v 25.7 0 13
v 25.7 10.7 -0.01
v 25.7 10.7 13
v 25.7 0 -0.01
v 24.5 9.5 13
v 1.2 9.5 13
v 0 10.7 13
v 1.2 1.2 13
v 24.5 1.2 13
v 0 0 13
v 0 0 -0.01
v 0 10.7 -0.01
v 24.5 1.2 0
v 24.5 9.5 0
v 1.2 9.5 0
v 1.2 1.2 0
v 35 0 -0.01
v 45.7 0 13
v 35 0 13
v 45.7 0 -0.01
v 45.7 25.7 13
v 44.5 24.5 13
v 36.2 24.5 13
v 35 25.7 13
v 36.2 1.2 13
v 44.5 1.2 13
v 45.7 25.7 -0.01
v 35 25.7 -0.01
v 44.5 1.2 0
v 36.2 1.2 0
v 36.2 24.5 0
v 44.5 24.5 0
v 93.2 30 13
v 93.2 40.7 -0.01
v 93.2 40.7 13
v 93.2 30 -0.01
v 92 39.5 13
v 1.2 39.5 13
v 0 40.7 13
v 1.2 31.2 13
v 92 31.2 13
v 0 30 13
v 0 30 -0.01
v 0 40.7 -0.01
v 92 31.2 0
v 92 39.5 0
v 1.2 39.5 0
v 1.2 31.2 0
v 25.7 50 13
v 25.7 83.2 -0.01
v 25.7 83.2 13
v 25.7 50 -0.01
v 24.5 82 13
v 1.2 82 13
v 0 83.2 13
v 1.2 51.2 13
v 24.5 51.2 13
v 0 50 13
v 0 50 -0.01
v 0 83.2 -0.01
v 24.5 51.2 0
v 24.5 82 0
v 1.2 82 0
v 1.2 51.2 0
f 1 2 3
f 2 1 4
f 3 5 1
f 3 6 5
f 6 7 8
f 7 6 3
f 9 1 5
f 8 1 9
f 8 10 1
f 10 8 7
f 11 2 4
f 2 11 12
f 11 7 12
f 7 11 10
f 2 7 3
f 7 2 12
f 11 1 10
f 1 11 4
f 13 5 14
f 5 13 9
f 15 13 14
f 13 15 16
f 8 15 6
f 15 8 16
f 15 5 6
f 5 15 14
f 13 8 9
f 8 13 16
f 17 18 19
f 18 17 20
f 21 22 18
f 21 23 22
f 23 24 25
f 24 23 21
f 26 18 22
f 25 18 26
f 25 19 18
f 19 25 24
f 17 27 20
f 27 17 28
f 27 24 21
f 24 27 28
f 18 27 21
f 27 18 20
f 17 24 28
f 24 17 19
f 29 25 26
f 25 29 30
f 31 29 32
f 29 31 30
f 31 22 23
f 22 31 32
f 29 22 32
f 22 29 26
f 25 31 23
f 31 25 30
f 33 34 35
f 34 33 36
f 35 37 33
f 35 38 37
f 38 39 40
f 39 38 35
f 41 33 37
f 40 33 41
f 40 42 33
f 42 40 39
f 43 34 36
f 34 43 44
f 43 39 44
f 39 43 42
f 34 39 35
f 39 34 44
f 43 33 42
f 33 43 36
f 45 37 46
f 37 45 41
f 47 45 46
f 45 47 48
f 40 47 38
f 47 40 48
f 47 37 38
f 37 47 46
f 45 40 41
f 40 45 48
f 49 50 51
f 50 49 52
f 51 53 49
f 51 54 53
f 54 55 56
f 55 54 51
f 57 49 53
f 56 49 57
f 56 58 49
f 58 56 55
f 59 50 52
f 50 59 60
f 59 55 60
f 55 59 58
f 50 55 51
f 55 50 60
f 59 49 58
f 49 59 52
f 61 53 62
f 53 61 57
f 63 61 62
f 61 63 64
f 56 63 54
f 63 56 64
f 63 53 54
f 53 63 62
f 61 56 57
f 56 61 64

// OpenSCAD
// file: ../../Base/Boxes.scad
// Fischertechnik Box Foundation
// Pre-designed Boxes

use <Constants.scad>

include <PlacementOptions.scad>

box190Width = 190;
box190Depth = 130;
box130Width = 130;
box130Depth = 95;
boxUsageHeight = 33.9;
boxWallThickness = 2.4;
boxBaseThickness = 1.0;

// getBoxWallThickness()
// Gets the wall thickness of a Fischertechnik Box

function getBoxWallThickness() = boxWallThickness;

// Gets the usable height of a fischertechnik box
function getBoxUsageHeight() = boxUsageHeight;

// Gets the thickness of the Fischertechnik box base.
function getBoxBaseThickness() = boxBaseThickness;

// Gets the usable inner space of a Box 190 as an x/y-list
function getBox190Space() = [
    box190Width - 2*getBoxWallThickness(), 
    box190Depth - 2*getBoxWallThickness() ];

// Imports the Fischertechnik empty box 130x190 mm and places it at position 0,0
// 190x130 are the outer sizes, the inner space is slightly smaller. Use getBox190Space() to get the inner sizes.
// This module needs the STL file "Fischertechnik Box 130x190.stl" in the library path.
// The box is positioned that the usable inner space is at the 0,0,0 position. The

module Box190() {
    translate([-getBoxWallThickness(),-getBoxWallThickness(),-getBoxBaseThickness()])
        import("Fischertechnik Box 130x190.stl", convexity=3);
}

// Gets the usable inner space of a Box 130 as an x/y-list
function getBox130Space() = [
    box130Width - 2*getBoxWallThickness(), 
    box130Depth - 2*getBoxWallThickness() ];

// Imports the Fischertechnik empty box 95x130 mm and places it at position 0,0
// 190x130 are the outer sizes, the inner space is slightly smaller. Use getBox190Space() to get the inner sizes.
// This module needs the STL file "Fischertechnik Box 95x130.stl" in the library path.
// The box is positioned that the usable inner space is at the 0,0,0 position. The

module Box130() {
    translate([-getBoxWallThickness(),-getBoxWallThickness(),-getBoxBaseThickness()])
        import("Fischertechnik Box 95x130.stl", convexity=3);
}

// Creates a web at the specified box walls
// corner 0 = LowerLeft, 1 = UpperLeft, 2 = UpperRight, 3 = LowerRight
// side 0 = LeftOfCorner, 1 = RightOfCorner
// distance = Distance in mm from the corner
// box = inner width and depth of the box (default: Box 190)
// webWidth = length of the web (default is 3 mms)
// webThickness = thickness of the web (default is 1 mm)

module BoxWeb(corner, side, distance, box=getBox190Space(), webWidth=3, webThickness=1.0) {
    sink = getBoxWallThickness()/2;

    width = (corner % 2 == 0) ? 
            (side == LeftOfCorner ? webWidth : webThickness) :
            (side == LeftOfCorner ? webThickness : webWidth);

    depth = (corner % 2 == 0) ? 
            (side == RightOfCorner ? webWidth : webThickness) :
            (side == RightOfCorner ? webThickness : webWidth);
    
    xDiff = corner == LowerLeft ? 
                (side == LeftOfCorner ? -sink : distance) :
            (corner == UpperLeft ?                
                (side == LeftOfCorner ? distance : -sink) :
            (corner == UpperRight ?
                (side == LeftOfCorner ? box.x-webWidth+sink : box.x-distance-webThickness) :
                (side == LeftOfCorner ? box.x-distance-webThickness: box.x-webWidth+sink)));

    yDiff = corner == LowerLeft ? 
                (side == RightOfCorner ? -sink : distance) :
            (corner == UpperLeft ?
                (side == RightOfCorner ? box.y-distance : box.y-webWidth+sink) :
            (corner == UpperRight ?
                (side == RightOfCorner ? box.y-webWidth+sink : box.y-distance) :
                (side == RightOfCorner ? distance : -sink)));
    
    translate([xDiff, yDiff, -getExcess()])
        cube([width, depth, boxUsageHeight + 2*getExcess()]);
}
// file: ../../Base/Rotation.scad
// Fischertechnik Box Foundation
// Geometry Helpers Rotation

include <PlacementOptions.scad>

// getRotatedSpace(space, rotation=NoRotation)
// Rotates the space dependent on the specified rotation

function getRotatedSpace(space, rotation=NoRotation) = [
    (rotation == Rotate90 || rotation == Rotate270) ? space.y : space.x,
    (rotation == Rotate90 || rotation == Rotate270) ? space.x : space.y
];

// Rotates the given space around the fixed left lower corner
// space = the space the children needs as width/depth list [width,depth]
// rotation = 0 Rotate0 degrees, 1 Rotate90 degrees, 2 Rotate180 degrees, 3 Rotate270 degrees (equivalent to -90)

module RotateFix(space, rotation=Rotate0) {
    dy = (rotation == Rotate0 || rotation == Rotate270) ? 0 :
        (rotation == Rotate90) ? space.x :
        space.y;
    dx = (rotation < Rotate180) ? 0 :
        (rotation == Rotate180) ? space.x :
        space.y;
    
    translate([dx, dy, 0])
        rotate([0, 0, rotations[rotation]])
            children();
}
// file: ../../Base/Alignment.scad
// Fischertechnik Box Foundation
// Geometry Helpers Alignment

include <PlacementOptions.scad>

// getAlignedX(elementWidth, spaceWidth, align=AlignRight, offset=0)
// Gets the aligned X offset of an element with the given
// width in the given space.
// elementWidth = The width of the element to positon
// spaceWidth = The space where the element should be aligned
// align = 0 AlignLeft, 1 AlignCenter, 2 AlignRight
// offset = an optional offset from the aligned position. When
// aligned left or centered, then positive values are in X direction.
// When aligned right then positive values are in negative X direction.

function getAlignedX(elementWidth, spaceWidth, align=AlignRight, offset=0) =
    (align == AlignLeft) ?
        offset :
        ((align == AlignCenter) ?
        (spaceWidth - elementWidth)/2 + offset :
        spaceWidth - offset - elementWidth);

// getAlignedY(elementDepth, spaceDepth, align=AlignTop, offset=0)
// Gets the aligned Y offset of an element with the given
// depth in the given space.
// elementDepth = The depth of the element to positon
// spaceDepth = The space where the element should be aligned
// align = 0 AlignBottom, 1 AlignCenter, 2 AlignTop
// offset = an optional offset from the aligned position. When
// aligned bottom or centered, then positive values are in Y direction.
// When aligned top then positive values are in negative Y direction.

function getAlignedY(elementDepth, spaceDepth, align=AlignTop, offset=0) =
    (align == AlignBottom) ?
        offset :
        ((align == AlignCenter) ?
        (spaceDepth - elementDepth)/2 + offset :
        spaceDepth - offset - elementDepth);
// file: ../../Base/Constants.scad
// Fischertechnik Box Foundation
// Constants

// Constant values necessary for multiple elements

// Base constants
dividerThickness = 1.2;
excess = 0.01;
fragments = 90;
tolerance = 0.8;

// Gets the thickness of a divider 
function getDividerThickness() = dividerThickness;

// Gets the excess that is used to merge walls into each other
function getExcess() = excess;

// Gets amount of fragments of a cylinder
function getFragments() = fragments;

// Gets the inner tolerance of a frame to each side
function getTolerance() = tolerance;


// Fischertechnik specific constants
axisDiameter = 4;
axisBottomDiameter = axisDiameter + 1;
standardEdgeDistance = 2.5;
standardWebDistance = 11.5;
standardCornerLength = 15;
tubeWallFactor = 1.6;

// Gets axis diameter
function getAxisDiameter() = axisDiameter;

// Gets axis bottom diameter for thicker part at the bottom
function getAxisBottomDiameter() = axisBottomDiameter;

// gets the standard distance to the wall of the box for dockable frames with webs
function getStandardEdgeDistance() = standardEdgeDistance;

// gets the standard distance of each web to the corner of the dockable frame
function getStandardWebDistance() = standardWebDistance;

// gets the standard length of the corner walls of a dockable frame
function getStandardCornerLength() = standardCornerLength;

// gets the wall thickness of a tube.
function getTubeWallThickness() = tubeWallFactor * getDividerThickness();
// file: ../../Base/PlacementOptions.scad
// Fischertechnik Box Foundation
// Placement Options

// Alignment
NoAlign = 0;
AlignLeft = 1;
AlignBottom = 2;
AlignCenter = 3;
AlignRight = 4;
AlignTop = 5;

// Element rotation degree steps
rotations = [0, -90, -180, -270];

// Rotation
NoRotation = 0;
Rotate0 = 0;
Rotate90 = 1;
Rotate180 = 2;
Rotate270 = 3;

// Docking (seen from above)
NoDock = -1;
DockLeft = 0;
DockTop = 1;
DockRight = 2;
DockCorner = 2;
DockBottom = 3;

// Web corners
LowerLeft = 0;
UpperLeft = 1;
UpperRight = 2;
LowerRight = 3;

// Web position relative to corner
LeftOfCorner = 0;
RightOfCorner = 1;
// file: ../../Elements/FramePulley.scad
// Fischertechnik Box Library
// Frame for Pulley
// 35795

use <../ModelBase/Simple.scad>

width = 22.5;
depth = 7.5;
height = 13;

// getFramePulleySpace(columns=1, rows=1)
// Gets the space the frame pulley needs as width and depth (.x and .y as a list)
// columns = Count of pulleys in X direction, small side
// rows = Count of pulleys in Y direction

function getFramePulleySpace(columns=1, rows=1) = getFrameOuterVolume([width*columns, depth*rows, height]);

// FramePulley(columns=1, rows=1)
// columns = Count of pulleys in X direction
// rows = Count of pulleys in Y direction
// The walls of the frame are 13 mm high. The small side of the pulley
// is 7.5 mm wide, the large side is 22.5 mm wide.
// The complete frame has a tolerance of addition 1 mm in each direction.

module FramePulley(columns=1, rows=1) {
    Frame([width*columns, depth*rows, height]);
}

// Tests
color("lightgray") {
    FramePulley();
}
// file: ../../Base/Placement.scad
// Fischertechnik Box Foundation
// Geometry Helpers Placement

use <Constants.scad>
use <Alignment.scad>
use <Rotation.scad>
use <Boxes.scad>

include <PlacementOptions.scad>

// Place(x=0, y=0, elementSpace=[0,0], alignX=AlignLeft, alignY=AlignBottom, rotation=Rotate0, boxSpace=getBox190Space())
// Places the child at the specified position
// y = Y-Position. This is a relative position when an X aligment is specified.
// x = X-Position. This is a relative position when an Y aligment is specified.
// elementSpace = space of the element to be placed [x,y]
// alignX = -1=NoAlign, 0 AlignLeft, 1 AlignCenter, 3 AlignRight (elementSpace and boxSpace required!)
// alignY = -1=NoAlign, 2 AlignBottom, 1 AlignCenter, 4 AlignTop (elementSpace and boxSpace required!)
// rotation = 0 Rotate0 0 degrees, 1 Rotate90 90 degrees, 
// 2 Rotate180 180 degrees, 3 Rotate270 270 degrees (equivalent to -90)
// boxSpace = Inner space of the box where the placement occurs [x,y] - default is Box 190x130 inner space

module Place(x=0, y=0, elementSpace=[0,0], 
  alignX=AlignLeft, alignY=AlignBottom, 
  rotation=NoRotation, boxSpace=getBox190Space()) {

    module Position(x, y, space, rotation=Rotate0) {
        translate([x, y, 0])
            RotateFix(space, rotation)
                children(0);
    }

    space = getRotatedSpace(elementSpace, rotation);
    alignedX = getAlignedX(space.x, boxSpace.x, alignX, x);
    alignedY = getAlignedY(space.y, boxSpace.y, alignY, y);
    Position(alignedX, alignedY, elementSpace, rotation)
        children(0);
}

// Center(space=getBox130Space(), elementSpace=[0,0])
// space = Space where the children is centered. For cylinder use centered=true and no elementSpace.
// elementSpace = space of the element to be centered [x,y]

module Center(space=getBox190Space(), elementSpace=[0,0]) {
    translate([(space.x - elementSpace.x) / 2, (space.y - elementSpace.y) / 2])
        children(0);
}

// CenterHorizontal(width=0, y=0, offset=0, space=getBox130Space())
// space = Space where the children is centered. For cylinder use centered=true and no elementSpace.
// elementSpace = space of the element to be centered [x,y]

module CenterHorizontal(width=0, y=0, offset=0, space=getBox190Space()) {
    translate([(space.x - width) / 2 + offset, y])
        children(0);
}

// CenterVertical(depth=0, x=0, offset=0, space=getBox130Space())
// space = Space where the children is centered. For cylinder use centered=true and no elementSpace.
// elementSpace = space of the element to be centered [x,y]

module CenterVerticalal(depth=0, x=0, offset=0, space=getBox190Space()) {
    translate([x, (space.y - depth) / 2 + offset])
        children(0);
}
// main file
// Fischertechnik Box Foundation
// Elements
// Test FramePulley

use <../../Base/Placement.scad>
use <../../Elements/FramePulley.scad>

include <../../Base/PlacementOptions.scad>

FramePulley();

Place(35, 0, getFramePulleySpace(), rotation=Rotate90)
    FramePulley();

Place(0, 30)
    FramePulley(4);

Place(0, 50)
    FramePulley(rows=4);
